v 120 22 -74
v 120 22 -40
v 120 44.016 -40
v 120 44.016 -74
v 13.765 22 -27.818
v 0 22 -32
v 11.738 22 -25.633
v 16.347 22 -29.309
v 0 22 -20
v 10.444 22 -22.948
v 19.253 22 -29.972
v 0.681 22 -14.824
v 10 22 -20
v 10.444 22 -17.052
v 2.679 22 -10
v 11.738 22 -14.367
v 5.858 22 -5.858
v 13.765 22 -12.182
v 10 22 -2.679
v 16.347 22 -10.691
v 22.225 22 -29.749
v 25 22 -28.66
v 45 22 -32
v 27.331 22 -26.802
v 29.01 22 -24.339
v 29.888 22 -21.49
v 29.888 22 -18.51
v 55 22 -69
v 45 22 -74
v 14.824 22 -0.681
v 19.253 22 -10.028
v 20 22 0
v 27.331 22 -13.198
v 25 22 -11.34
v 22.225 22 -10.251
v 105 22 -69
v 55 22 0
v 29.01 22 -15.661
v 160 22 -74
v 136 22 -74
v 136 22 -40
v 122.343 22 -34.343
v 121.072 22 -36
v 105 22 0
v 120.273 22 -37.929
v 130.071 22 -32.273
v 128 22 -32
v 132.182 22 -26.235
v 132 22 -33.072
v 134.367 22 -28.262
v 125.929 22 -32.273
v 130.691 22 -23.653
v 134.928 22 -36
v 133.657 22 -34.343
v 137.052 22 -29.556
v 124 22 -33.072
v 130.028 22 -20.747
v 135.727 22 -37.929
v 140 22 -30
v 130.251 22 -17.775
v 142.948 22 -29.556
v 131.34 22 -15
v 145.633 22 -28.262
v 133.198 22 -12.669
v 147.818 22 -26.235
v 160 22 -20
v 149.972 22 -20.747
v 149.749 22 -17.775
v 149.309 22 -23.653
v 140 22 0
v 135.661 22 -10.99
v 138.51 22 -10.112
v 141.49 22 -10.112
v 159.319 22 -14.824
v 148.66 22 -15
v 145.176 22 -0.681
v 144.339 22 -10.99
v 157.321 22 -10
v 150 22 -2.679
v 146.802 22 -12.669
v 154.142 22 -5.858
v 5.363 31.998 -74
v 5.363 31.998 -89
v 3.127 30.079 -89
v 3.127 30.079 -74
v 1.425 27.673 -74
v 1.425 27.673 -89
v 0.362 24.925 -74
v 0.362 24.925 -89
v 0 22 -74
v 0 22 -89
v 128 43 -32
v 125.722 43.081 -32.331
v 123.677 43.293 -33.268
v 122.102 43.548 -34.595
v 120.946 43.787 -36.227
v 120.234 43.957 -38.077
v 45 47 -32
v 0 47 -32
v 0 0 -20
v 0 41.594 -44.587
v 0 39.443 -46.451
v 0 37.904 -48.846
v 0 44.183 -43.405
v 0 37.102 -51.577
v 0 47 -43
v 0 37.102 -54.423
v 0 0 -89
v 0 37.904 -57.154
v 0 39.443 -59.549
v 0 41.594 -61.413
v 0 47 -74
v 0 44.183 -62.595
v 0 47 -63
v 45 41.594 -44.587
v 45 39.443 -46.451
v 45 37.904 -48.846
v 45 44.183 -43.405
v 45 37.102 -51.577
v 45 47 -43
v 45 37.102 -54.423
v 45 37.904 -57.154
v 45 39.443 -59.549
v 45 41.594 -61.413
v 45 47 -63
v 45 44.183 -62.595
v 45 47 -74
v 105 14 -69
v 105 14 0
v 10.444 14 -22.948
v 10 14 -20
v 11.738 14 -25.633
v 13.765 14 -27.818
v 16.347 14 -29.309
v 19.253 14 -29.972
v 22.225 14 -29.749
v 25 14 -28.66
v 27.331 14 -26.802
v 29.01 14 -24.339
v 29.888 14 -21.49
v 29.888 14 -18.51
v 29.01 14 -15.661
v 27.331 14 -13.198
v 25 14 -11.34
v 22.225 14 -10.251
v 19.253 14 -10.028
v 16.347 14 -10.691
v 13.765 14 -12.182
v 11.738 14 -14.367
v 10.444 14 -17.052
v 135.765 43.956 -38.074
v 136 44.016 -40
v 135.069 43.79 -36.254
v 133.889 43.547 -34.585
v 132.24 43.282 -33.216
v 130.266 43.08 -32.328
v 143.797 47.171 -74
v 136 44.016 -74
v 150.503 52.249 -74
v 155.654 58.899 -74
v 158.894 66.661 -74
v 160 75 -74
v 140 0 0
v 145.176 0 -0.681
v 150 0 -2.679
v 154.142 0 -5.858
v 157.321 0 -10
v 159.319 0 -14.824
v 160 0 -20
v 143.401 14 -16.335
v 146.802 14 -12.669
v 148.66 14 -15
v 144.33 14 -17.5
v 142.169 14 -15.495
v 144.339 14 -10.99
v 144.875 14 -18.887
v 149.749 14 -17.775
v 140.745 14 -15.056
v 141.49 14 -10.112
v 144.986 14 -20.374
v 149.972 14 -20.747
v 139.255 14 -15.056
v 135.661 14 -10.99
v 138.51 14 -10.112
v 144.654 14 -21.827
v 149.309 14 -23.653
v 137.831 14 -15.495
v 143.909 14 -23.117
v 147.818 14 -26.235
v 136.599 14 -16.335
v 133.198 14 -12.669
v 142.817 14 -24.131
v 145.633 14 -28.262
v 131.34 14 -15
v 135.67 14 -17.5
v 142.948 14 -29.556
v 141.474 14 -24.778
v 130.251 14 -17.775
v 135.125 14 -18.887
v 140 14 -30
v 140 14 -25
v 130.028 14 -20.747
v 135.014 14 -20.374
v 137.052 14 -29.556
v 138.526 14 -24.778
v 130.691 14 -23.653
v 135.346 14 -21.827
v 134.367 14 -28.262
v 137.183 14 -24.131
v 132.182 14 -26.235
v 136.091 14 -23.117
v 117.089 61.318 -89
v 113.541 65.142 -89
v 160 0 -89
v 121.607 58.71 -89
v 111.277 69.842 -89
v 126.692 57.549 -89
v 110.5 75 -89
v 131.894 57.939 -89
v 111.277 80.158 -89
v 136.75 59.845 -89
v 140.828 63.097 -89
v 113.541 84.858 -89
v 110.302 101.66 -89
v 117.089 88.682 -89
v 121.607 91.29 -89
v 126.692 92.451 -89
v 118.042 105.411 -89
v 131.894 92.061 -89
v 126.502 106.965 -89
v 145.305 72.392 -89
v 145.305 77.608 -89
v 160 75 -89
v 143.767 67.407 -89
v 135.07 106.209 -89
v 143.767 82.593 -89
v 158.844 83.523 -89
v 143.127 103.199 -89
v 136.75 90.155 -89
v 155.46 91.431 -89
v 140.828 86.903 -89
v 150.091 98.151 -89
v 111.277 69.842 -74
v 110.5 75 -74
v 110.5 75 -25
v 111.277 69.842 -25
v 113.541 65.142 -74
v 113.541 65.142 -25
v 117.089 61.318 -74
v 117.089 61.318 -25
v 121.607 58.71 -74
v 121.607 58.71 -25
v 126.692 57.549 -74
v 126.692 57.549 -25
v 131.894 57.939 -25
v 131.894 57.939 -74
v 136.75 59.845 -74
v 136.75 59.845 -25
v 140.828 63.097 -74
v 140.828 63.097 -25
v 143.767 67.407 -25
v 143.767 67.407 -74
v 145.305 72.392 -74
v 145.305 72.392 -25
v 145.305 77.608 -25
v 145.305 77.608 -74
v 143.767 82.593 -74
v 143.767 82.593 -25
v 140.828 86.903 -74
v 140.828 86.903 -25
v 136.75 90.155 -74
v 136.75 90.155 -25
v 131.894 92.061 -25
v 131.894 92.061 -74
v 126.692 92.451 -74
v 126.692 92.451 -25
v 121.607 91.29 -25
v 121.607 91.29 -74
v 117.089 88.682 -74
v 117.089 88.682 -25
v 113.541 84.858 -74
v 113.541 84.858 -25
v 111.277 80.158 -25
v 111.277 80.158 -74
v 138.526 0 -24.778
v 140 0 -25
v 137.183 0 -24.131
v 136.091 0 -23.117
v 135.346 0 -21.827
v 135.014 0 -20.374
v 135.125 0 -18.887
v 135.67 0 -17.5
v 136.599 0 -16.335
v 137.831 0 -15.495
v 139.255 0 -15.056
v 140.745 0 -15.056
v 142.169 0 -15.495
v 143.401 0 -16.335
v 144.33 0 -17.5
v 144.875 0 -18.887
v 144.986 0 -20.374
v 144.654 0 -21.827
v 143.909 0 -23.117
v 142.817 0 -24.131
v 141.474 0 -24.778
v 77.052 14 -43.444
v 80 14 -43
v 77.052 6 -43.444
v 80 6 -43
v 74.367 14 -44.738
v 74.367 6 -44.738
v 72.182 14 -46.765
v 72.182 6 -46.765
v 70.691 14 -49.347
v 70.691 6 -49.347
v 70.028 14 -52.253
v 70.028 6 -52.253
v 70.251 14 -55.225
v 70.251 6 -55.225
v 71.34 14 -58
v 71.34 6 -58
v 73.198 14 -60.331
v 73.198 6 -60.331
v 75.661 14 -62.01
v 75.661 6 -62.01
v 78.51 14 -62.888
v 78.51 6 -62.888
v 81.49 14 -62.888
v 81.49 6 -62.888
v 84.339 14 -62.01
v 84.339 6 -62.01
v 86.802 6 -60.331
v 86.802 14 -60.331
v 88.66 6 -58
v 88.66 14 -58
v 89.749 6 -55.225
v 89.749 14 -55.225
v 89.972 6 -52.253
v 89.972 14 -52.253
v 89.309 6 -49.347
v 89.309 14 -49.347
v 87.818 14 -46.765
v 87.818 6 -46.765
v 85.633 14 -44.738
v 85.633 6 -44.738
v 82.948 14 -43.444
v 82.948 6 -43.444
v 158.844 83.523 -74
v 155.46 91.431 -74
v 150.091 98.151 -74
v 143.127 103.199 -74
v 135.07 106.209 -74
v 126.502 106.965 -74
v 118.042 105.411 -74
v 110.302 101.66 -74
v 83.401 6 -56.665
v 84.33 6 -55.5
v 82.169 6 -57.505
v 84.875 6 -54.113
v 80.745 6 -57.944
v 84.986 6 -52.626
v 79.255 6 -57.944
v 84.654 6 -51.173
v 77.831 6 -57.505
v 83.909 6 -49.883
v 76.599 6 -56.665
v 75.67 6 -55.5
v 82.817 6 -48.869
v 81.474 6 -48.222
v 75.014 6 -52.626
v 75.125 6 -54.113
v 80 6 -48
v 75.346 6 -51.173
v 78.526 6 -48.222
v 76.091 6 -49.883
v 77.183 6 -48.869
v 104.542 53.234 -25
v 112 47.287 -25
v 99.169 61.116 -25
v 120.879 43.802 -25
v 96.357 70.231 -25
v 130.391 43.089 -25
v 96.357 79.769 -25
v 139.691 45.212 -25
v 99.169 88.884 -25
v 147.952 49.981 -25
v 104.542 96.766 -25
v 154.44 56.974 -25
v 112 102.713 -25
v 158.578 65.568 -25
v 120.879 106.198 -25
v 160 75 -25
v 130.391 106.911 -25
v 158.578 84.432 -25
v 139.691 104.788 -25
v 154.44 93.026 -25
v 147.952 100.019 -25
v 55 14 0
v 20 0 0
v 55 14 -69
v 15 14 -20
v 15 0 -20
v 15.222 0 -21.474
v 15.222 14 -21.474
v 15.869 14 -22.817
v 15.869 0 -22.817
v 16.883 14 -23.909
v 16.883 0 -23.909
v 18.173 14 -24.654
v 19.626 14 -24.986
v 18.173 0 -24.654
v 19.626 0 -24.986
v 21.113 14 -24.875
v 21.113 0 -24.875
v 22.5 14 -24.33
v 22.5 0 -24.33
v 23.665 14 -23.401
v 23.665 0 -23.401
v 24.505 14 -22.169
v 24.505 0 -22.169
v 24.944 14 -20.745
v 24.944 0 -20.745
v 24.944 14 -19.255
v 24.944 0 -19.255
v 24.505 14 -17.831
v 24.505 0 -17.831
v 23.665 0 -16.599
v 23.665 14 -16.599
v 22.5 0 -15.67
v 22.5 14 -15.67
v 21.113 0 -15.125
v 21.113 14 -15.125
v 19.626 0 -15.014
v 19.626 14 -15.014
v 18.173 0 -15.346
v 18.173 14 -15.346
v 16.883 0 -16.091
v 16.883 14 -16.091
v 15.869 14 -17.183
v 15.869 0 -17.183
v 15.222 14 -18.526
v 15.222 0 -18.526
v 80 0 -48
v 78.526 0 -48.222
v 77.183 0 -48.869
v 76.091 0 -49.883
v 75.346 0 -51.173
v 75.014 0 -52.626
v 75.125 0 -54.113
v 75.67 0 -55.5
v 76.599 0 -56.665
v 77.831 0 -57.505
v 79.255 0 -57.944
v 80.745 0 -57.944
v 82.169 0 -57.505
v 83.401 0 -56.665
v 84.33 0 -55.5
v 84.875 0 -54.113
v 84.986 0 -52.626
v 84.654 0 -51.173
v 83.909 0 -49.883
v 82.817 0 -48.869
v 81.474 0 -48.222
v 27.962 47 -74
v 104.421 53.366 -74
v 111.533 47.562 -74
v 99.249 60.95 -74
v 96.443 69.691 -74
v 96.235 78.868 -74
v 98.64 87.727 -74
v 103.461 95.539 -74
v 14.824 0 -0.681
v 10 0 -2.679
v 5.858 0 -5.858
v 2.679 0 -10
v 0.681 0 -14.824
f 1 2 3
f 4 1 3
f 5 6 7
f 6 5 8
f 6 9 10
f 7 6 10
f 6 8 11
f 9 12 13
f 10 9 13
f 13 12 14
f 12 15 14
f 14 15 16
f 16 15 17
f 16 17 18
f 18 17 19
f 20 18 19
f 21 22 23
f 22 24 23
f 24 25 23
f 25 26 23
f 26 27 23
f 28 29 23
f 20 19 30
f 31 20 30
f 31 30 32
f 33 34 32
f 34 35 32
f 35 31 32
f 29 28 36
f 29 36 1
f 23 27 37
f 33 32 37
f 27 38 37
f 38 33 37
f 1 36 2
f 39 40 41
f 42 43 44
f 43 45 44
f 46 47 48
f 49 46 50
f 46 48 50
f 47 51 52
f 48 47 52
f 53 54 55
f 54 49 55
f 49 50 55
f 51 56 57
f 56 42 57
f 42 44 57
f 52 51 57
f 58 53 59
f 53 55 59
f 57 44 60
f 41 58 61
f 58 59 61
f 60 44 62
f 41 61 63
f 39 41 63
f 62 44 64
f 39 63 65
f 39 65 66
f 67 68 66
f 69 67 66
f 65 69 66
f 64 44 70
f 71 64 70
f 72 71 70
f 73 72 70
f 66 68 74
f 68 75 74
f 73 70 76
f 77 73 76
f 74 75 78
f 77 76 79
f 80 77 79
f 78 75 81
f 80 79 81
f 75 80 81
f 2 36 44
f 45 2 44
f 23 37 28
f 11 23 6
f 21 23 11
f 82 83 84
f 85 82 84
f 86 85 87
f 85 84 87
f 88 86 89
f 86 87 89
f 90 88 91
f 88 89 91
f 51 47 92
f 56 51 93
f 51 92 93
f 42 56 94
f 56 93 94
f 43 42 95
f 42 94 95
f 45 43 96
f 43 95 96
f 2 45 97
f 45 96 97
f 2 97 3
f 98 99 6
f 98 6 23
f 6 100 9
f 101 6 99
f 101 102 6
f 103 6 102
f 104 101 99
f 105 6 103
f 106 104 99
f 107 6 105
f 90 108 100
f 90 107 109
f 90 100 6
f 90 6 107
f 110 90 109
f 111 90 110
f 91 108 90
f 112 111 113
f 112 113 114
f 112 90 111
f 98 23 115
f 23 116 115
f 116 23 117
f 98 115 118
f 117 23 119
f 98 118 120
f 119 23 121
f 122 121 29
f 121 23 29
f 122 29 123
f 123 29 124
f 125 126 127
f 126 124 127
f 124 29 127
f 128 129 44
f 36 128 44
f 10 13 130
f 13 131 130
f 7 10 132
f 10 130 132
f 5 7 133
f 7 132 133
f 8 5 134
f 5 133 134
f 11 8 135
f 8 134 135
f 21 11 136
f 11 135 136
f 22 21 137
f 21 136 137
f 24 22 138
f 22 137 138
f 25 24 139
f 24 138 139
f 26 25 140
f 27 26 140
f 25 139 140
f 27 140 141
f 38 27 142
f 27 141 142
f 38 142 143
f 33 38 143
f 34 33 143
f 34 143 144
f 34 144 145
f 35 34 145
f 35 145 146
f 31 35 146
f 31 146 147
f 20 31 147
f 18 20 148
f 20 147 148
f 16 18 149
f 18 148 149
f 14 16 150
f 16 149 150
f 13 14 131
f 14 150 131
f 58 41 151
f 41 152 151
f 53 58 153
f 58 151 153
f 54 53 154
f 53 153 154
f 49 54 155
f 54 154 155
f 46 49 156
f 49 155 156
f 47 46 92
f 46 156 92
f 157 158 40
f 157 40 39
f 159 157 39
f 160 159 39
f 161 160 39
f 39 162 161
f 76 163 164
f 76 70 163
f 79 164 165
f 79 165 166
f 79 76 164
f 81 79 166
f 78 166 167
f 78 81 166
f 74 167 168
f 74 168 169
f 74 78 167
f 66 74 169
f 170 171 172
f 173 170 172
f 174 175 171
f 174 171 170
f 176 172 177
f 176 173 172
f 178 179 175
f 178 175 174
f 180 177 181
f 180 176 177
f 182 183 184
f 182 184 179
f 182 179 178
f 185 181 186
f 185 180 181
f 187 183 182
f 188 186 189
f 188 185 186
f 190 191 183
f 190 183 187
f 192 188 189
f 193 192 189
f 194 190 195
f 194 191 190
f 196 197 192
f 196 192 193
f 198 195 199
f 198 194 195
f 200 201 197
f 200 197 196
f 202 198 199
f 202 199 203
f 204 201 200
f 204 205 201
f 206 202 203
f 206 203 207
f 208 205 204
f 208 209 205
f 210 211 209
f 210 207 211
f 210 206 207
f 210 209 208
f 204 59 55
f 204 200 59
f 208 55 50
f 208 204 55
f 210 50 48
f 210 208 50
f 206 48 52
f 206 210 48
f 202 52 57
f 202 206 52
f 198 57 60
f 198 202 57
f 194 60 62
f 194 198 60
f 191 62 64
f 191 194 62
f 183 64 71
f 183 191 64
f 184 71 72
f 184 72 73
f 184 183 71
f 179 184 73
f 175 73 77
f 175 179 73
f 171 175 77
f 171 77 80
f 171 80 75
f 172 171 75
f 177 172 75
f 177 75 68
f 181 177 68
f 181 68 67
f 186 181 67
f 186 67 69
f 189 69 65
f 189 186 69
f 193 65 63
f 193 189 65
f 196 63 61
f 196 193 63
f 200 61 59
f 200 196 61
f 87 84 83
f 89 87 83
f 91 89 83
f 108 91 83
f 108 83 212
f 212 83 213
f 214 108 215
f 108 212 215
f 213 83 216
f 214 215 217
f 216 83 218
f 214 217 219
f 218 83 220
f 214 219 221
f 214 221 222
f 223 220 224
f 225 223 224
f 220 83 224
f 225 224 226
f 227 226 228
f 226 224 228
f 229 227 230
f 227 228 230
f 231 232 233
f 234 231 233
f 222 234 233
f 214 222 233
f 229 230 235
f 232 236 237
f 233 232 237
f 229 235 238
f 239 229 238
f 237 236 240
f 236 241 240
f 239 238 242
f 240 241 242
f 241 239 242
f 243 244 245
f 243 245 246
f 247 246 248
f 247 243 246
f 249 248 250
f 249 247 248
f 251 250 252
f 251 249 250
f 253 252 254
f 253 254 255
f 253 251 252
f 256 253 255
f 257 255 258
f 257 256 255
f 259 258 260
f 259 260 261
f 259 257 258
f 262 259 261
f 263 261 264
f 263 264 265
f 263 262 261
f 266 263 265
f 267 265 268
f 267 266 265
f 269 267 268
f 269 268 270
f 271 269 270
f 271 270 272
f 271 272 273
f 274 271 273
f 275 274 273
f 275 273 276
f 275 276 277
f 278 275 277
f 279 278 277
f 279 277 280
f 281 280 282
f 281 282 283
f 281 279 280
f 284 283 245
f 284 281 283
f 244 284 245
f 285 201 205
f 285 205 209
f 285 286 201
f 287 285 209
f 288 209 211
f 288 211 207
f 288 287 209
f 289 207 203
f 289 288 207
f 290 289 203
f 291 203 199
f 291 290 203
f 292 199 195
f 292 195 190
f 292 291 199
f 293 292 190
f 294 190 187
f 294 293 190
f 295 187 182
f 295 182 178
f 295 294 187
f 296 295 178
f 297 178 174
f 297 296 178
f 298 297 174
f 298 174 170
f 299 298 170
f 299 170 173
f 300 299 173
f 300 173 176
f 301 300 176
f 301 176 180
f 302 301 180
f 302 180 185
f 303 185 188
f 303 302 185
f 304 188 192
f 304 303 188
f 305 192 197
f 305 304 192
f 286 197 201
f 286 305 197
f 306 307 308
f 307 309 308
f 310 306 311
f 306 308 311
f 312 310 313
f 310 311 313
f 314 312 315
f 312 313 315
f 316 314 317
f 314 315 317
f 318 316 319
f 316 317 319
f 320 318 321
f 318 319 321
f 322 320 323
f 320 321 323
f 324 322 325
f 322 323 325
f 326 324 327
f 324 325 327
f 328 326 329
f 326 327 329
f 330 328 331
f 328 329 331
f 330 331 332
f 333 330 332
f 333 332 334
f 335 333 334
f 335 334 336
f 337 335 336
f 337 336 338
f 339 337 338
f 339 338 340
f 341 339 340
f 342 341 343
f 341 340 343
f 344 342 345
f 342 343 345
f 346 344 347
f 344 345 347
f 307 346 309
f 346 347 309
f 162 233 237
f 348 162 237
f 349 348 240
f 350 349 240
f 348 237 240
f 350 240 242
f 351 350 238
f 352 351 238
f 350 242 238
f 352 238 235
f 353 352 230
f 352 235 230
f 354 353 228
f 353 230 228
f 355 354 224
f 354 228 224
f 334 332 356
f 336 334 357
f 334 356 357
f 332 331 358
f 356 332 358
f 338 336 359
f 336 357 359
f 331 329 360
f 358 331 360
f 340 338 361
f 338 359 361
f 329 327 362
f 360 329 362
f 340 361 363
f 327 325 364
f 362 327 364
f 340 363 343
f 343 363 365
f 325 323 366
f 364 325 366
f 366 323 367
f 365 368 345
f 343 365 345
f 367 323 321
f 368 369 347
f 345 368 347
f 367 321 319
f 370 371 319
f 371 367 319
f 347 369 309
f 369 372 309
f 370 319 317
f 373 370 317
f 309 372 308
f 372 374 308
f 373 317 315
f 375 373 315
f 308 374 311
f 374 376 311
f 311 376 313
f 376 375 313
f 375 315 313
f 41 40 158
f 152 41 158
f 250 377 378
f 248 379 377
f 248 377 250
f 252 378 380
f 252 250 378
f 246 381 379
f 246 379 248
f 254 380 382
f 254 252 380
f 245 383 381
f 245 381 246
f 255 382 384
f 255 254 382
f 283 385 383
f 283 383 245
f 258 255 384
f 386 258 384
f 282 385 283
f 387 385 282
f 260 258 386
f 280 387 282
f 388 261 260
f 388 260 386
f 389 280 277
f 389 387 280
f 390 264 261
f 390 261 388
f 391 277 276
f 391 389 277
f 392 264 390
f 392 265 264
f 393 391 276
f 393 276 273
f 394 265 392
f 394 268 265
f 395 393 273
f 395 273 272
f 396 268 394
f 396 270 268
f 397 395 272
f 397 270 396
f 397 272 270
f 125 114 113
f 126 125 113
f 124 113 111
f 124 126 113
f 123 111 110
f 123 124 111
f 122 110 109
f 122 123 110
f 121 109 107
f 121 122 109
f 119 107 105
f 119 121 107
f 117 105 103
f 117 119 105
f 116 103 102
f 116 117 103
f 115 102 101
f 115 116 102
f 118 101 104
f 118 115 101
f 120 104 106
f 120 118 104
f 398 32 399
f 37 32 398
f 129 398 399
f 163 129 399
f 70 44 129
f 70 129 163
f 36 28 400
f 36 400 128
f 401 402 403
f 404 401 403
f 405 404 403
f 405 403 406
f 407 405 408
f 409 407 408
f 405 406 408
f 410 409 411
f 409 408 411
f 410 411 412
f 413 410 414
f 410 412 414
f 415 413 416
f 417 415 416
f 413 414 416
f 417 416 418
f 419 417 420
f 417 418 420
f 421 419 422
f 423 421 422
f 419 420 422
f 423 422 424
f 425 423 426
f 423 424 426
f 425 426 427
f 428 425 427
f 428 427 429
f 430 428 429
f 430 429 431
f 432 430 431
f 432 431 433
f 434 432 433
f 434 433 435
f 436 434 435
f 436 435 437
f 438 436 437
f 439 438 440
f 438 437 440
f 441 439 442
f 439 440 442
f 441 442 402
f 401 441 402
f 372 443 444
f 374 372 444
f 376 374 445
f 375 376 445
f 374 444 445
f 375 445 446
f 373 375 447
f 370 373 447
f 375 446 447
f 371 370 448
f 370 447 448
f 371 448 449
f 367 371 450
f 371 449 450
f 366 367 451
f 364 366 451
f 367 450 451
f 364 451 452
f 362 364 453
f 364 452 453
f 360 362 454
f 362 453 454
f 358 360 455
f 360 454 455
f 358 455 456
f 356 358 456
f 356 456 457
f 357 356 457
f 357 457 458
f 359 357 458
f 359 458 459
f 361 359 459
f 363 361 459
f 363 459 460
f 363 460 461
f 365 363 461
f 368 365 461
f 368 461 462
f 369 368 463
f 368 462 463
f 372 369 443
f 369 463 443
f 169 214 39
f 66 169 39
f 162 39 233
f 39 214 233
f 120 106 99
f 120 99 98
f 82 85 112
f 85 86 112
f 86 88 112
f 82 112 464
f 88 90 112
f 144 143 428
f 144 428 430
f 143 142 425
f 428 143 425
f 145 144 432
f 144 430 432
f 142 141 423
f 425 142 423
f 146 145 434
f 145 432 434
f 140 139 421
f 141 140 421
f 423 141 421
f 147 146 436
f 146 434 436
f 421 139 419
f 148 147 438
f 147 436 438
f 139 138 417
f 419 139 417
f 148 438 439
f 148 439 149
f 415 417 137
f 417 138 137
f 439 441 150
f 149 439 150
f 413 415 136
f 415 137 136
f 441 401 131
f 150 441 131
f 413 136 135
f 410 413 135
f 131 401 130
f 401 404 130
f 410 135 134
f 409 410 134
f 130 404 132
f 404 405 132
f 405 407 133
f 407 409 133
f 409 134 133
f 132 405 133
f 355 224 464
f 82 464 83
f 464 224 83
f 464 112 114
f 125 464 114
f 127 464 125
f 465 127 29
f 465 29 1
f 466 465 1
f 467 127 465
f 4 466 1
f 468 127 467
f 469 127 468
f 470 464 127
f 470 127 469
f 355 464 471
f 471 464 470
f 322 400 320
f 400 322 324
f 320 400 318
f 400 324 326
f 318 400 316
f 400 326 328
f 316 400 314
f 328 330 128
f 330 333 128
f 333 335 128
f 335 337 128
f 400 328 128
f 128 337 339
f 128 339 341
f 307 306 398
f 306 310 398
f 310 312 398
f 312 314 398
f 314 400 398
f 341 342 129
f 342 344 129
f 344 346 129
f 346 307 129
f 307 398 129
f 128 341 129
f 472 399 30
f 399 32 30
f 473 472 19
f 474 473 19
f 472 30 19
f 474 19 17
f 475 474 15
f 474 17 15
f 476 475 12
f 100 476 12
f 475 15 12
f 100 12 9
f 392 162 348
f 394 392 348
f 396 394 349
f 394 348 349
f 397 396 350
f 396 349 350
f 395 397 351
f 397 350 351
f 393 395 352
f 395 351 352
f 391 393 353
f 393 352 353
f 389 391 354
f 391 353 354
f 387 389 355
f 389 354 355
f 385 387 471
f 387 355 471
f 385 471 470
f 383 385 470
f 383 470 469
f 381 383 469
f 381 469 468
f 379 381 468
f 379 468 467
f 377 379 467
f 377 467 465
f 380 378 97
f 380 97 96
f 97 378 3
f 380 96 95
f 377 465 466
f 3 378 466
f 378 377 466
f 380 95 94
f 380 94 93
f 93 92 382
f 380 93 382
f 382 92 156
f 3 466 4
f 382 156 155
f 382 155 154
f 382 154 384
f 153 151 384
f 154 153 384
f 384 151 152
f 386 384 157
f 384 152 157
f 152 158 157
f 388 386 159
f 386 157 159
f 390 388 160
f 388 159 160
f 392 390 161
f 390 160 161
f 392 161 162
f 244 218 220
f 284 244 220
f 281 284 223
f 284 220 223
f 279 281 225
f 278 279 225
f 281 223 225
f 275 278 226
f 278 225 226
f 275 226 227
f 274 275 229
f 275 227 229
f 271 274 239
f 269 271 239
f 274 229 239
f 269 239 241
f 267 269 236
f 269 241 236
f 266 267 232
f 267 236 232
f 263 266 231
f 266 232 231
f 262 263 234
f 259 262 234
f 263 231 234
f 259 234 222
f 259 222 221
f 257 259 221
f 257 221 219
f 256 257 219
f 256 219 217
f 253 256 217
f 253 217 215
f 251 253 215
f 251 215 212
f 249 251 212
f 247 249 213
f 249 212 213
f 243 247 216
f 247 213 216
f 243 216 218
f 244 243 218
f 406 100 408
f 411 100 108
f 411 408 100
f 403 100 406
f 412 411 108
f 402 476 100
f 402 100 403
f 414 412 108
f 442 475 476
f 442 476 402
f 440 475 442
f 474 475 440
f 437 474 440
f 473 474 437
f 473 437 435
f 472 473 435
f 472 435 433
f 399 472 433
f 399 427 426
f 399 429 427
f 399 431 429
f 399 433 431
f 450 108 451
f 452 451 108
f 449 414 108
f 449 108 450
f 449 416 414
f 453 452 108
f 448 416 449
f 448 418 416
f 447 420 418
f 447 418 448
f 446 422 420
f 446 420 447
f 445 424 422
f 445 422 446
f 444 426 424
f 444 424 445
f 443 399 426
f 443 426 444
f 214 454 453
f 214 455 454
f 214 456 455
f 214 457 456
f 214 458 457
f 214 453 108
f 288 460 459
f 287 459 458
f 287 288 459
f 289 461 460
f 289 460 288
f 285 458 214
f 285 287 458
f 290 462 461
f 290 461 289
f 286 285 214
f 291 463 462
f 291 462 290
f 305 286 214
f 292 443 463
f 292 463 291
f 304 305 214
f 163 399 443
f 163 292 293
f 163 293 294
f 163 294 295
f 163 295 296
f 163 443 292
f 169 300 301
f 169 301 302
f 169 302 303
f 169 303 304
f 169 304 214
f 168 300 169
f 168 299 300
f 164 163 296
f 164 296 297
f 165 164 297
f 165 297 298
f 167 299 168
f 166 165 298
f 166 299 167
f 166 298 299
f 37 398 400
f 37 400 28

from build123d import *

# Parameters (mm, degrees)
CROQUIS3_W              = 160
CROQUIS3_H              = 22
SALIENTE_EXTRUIR1_DEPTH = 89
CROQUIS6_W              = 50
CROQUIS6_H              = 8
CORTAR_EXTRUIR1_DEPTH   = 69
REDONDEO1_R             = 20
REDONDEO2_R             = 20
CROQUIS7_R              = 17.5
SALIENTE_EXTRUIR3_DEPTH = 15
CROQUIS8_R              = 32
CROQUIS8_R_2            = 17.5
SALIENTE_EXTRUIR4_DEPTH = 49
CROQUIS9_W              = 45
CROQUIS9_H              = 25
CROQUIS9_W_2            = 16
SALIENTE_EXTRUIR5_DEPTH = 42
REDONDEO3_R             = 8
REDONDEO4_R             = 8
CROQUIS10_W             = 45
CROQUIS10_H             = 10


with BuildPart() as part:
    # Croquis3 → Saliente-Extruir1 (new body)
    with BuildSketch(Plane.XY):
        with Locations((80, 11)):
            Rectangle(CROQUIS3_W, CROQUIS3_H)
    extrude(amount=-SALIENTE_EXTRUIR1_DEPTH)

    # Croquis6 → Cortar-Extruir1 (cut)
    with BuildSketch(Plane.XY):
        with Locations((80, 18)):
            Rectangle(CROQUIS6_W, CROQUIS6_H)
    extrude(amount=-CORTAR_EXTRUIR1_DEPTH, mode=Mode.SUBTRACT)

    # Redondeo1
    redondeo1_edges = [part.edges().sort_by_distance(p)[0] for p in [
        (160, 11, 0),
    ]]
    fillet(redondeo1_edges, radius=REDONDEO1_R)

    # Redondeo2
    redondeo2_edges = [part.edges().sort_by_distance(p)[0] for p in [
        (0, 11, 0),
    ]]
    fillet(redondeo2_edges, radius=REDONDEO2_R)



with BuildPart() as body_2:
    # Croquis7 → Saliente-Extruir3 (new body)
    with BuildSketch(Plane(origin=(0, 0, -89), x_dir=(-1, 0, 0), z_dir=(0, 0, -1))):
        with BuildLine():
            Line((0, 22), (-160, 22))
            Line((-160, 22), (-160, 75))
            ThreePointArc((-160, 75), (-143.127064471, 103.198792891), (-110.301754969, 101.660309879))
            Line((-110.301754969, 101.660309879), (-5.363158113, 31.997616205))
            ThreePointArc((-5.363158113, 31.997616205), (-1.425452666, 27.672649177), (0, 22))
        make_face()
        with Locations((-128, 75)):
            Circle(CROQUIS7_R, mode=Mode.SUBTRACT)
    extrude(amount=-SALIENTE_EXTRUIR3_DEPTH)

    # Croquis8 → Saliente-Extruir4 (add)
    with BuildSketch(Plane.XY.offset(-74)):
        with Locations((128, 75)):
            Circle(CROQUIS8_R)
        with Locations(Location((128, 75, 0), (0, 0, 180))):
            Circle(CROQUIS8_R_2, mode=Mode.SUBTRACT)
    extrude(amount=SALIENTE_EXTRUIR4_DEPTH)


with BuildPart() as part_1:
    add(part.part)

    add(body_2.part)  # Saliente-Extruir5 merges body 2
    # Croquis9 → Saliente-Extruir5 (add)
    with BuildSketch(Plane.XY.offset(-74)):
        with Locations((22.5, 34.5)):
            Rectangle(CROQUIS9_W, CROQUIS9_H)
        with Locations((128, 34.5)):
            Rectangle(CROQUIS9_W_2, CROQUIS9_H)
    extrude(amount=SALIENTE_EXTRUIR5_DEPTH)

    # Redondeo3
    redondeo3_edges = [part_1.edges().sort_by_distance(p)[0] for p in [
        (136, 33.008066615, -32),
    ]]
    fillet(redondeo3_edges, radius=REDONDEO3_R)

    # Redondeo4
    redondeo4_edges = [part_1.edges().sort_by_distance(p)[0] for p in [
        (120, 33.008066615, -32),
    ]]
    fillet(redondeo4_edges, radius=REDONDEO4_R - 0.0001)  # a hair under: the kernel refuses the full size

    # Croquis10 → Cortar-Revolución1 (revolve, cut)
    with BuildSketch(Plane.XY.offset(-53)):
        with Locations((22.5, 42)):
            Rectangle(CROQUIS10_W, CROQUIS10_H)
    revolve(axis=Axis((45, 47, -53), (-1, 0, 0)), mode=Mode.SUBTRACT)

    # Croquis14 → Cortar-Revolución2 (revolve, cut)
    with BuildSketch(Plane.XY.offset(-53), mode=Mode.PRIVATE) as cortar_revoluci_n2_sk:
        Polygon((70, 14), (70, 6), (75, 6), (75, -24.123756484), (80, -24.123756484), (80, 14), align=None)
    revolve(cortar_revoluci_n2_sk.sketch.rotate(Axis((80, 14, -53), (0, -1, 0)), 270), axis=Axis((80, 14, -53), (0, -1, 0)), mode=Mode.SUBTRACT)

    # Croquis16 → Cortar-Revolución3 (revolve, cut)
    with BuildSketch(Plane.XY.offset(-20)):
        Polygon((10, 22), (10, 14), (15, 14), (15, -14.561047929), (20, -14.561047929), (20, 22), align=None)
    revolve(axis=Axis((20, 59.332394472, -20), (0, -1, 0)), mode=Mode.SUBTRACT)

    # Croquis17 → Cortar-Revolución4 (revolve, cut)
    with BuildSketch(Plane.XY.offset(-20), mode=Mode.PRIVATE) as cortar_revoluci_n4_sk:
        Polygon((140, 22), (150, 22), (150, 14), (145, 14), (145, 0), (140, 0), align=None)
    revolve(cortar_revoluci_n4_sk.sketch.rotate(Axis((140, -22.856797355, -20), (0, 1, 0)), 90), axis=Axis((140, -22.856797355, -20), (0, 1, 0)), mode=Mode.SUBTRACT)


solid = part_1.part
